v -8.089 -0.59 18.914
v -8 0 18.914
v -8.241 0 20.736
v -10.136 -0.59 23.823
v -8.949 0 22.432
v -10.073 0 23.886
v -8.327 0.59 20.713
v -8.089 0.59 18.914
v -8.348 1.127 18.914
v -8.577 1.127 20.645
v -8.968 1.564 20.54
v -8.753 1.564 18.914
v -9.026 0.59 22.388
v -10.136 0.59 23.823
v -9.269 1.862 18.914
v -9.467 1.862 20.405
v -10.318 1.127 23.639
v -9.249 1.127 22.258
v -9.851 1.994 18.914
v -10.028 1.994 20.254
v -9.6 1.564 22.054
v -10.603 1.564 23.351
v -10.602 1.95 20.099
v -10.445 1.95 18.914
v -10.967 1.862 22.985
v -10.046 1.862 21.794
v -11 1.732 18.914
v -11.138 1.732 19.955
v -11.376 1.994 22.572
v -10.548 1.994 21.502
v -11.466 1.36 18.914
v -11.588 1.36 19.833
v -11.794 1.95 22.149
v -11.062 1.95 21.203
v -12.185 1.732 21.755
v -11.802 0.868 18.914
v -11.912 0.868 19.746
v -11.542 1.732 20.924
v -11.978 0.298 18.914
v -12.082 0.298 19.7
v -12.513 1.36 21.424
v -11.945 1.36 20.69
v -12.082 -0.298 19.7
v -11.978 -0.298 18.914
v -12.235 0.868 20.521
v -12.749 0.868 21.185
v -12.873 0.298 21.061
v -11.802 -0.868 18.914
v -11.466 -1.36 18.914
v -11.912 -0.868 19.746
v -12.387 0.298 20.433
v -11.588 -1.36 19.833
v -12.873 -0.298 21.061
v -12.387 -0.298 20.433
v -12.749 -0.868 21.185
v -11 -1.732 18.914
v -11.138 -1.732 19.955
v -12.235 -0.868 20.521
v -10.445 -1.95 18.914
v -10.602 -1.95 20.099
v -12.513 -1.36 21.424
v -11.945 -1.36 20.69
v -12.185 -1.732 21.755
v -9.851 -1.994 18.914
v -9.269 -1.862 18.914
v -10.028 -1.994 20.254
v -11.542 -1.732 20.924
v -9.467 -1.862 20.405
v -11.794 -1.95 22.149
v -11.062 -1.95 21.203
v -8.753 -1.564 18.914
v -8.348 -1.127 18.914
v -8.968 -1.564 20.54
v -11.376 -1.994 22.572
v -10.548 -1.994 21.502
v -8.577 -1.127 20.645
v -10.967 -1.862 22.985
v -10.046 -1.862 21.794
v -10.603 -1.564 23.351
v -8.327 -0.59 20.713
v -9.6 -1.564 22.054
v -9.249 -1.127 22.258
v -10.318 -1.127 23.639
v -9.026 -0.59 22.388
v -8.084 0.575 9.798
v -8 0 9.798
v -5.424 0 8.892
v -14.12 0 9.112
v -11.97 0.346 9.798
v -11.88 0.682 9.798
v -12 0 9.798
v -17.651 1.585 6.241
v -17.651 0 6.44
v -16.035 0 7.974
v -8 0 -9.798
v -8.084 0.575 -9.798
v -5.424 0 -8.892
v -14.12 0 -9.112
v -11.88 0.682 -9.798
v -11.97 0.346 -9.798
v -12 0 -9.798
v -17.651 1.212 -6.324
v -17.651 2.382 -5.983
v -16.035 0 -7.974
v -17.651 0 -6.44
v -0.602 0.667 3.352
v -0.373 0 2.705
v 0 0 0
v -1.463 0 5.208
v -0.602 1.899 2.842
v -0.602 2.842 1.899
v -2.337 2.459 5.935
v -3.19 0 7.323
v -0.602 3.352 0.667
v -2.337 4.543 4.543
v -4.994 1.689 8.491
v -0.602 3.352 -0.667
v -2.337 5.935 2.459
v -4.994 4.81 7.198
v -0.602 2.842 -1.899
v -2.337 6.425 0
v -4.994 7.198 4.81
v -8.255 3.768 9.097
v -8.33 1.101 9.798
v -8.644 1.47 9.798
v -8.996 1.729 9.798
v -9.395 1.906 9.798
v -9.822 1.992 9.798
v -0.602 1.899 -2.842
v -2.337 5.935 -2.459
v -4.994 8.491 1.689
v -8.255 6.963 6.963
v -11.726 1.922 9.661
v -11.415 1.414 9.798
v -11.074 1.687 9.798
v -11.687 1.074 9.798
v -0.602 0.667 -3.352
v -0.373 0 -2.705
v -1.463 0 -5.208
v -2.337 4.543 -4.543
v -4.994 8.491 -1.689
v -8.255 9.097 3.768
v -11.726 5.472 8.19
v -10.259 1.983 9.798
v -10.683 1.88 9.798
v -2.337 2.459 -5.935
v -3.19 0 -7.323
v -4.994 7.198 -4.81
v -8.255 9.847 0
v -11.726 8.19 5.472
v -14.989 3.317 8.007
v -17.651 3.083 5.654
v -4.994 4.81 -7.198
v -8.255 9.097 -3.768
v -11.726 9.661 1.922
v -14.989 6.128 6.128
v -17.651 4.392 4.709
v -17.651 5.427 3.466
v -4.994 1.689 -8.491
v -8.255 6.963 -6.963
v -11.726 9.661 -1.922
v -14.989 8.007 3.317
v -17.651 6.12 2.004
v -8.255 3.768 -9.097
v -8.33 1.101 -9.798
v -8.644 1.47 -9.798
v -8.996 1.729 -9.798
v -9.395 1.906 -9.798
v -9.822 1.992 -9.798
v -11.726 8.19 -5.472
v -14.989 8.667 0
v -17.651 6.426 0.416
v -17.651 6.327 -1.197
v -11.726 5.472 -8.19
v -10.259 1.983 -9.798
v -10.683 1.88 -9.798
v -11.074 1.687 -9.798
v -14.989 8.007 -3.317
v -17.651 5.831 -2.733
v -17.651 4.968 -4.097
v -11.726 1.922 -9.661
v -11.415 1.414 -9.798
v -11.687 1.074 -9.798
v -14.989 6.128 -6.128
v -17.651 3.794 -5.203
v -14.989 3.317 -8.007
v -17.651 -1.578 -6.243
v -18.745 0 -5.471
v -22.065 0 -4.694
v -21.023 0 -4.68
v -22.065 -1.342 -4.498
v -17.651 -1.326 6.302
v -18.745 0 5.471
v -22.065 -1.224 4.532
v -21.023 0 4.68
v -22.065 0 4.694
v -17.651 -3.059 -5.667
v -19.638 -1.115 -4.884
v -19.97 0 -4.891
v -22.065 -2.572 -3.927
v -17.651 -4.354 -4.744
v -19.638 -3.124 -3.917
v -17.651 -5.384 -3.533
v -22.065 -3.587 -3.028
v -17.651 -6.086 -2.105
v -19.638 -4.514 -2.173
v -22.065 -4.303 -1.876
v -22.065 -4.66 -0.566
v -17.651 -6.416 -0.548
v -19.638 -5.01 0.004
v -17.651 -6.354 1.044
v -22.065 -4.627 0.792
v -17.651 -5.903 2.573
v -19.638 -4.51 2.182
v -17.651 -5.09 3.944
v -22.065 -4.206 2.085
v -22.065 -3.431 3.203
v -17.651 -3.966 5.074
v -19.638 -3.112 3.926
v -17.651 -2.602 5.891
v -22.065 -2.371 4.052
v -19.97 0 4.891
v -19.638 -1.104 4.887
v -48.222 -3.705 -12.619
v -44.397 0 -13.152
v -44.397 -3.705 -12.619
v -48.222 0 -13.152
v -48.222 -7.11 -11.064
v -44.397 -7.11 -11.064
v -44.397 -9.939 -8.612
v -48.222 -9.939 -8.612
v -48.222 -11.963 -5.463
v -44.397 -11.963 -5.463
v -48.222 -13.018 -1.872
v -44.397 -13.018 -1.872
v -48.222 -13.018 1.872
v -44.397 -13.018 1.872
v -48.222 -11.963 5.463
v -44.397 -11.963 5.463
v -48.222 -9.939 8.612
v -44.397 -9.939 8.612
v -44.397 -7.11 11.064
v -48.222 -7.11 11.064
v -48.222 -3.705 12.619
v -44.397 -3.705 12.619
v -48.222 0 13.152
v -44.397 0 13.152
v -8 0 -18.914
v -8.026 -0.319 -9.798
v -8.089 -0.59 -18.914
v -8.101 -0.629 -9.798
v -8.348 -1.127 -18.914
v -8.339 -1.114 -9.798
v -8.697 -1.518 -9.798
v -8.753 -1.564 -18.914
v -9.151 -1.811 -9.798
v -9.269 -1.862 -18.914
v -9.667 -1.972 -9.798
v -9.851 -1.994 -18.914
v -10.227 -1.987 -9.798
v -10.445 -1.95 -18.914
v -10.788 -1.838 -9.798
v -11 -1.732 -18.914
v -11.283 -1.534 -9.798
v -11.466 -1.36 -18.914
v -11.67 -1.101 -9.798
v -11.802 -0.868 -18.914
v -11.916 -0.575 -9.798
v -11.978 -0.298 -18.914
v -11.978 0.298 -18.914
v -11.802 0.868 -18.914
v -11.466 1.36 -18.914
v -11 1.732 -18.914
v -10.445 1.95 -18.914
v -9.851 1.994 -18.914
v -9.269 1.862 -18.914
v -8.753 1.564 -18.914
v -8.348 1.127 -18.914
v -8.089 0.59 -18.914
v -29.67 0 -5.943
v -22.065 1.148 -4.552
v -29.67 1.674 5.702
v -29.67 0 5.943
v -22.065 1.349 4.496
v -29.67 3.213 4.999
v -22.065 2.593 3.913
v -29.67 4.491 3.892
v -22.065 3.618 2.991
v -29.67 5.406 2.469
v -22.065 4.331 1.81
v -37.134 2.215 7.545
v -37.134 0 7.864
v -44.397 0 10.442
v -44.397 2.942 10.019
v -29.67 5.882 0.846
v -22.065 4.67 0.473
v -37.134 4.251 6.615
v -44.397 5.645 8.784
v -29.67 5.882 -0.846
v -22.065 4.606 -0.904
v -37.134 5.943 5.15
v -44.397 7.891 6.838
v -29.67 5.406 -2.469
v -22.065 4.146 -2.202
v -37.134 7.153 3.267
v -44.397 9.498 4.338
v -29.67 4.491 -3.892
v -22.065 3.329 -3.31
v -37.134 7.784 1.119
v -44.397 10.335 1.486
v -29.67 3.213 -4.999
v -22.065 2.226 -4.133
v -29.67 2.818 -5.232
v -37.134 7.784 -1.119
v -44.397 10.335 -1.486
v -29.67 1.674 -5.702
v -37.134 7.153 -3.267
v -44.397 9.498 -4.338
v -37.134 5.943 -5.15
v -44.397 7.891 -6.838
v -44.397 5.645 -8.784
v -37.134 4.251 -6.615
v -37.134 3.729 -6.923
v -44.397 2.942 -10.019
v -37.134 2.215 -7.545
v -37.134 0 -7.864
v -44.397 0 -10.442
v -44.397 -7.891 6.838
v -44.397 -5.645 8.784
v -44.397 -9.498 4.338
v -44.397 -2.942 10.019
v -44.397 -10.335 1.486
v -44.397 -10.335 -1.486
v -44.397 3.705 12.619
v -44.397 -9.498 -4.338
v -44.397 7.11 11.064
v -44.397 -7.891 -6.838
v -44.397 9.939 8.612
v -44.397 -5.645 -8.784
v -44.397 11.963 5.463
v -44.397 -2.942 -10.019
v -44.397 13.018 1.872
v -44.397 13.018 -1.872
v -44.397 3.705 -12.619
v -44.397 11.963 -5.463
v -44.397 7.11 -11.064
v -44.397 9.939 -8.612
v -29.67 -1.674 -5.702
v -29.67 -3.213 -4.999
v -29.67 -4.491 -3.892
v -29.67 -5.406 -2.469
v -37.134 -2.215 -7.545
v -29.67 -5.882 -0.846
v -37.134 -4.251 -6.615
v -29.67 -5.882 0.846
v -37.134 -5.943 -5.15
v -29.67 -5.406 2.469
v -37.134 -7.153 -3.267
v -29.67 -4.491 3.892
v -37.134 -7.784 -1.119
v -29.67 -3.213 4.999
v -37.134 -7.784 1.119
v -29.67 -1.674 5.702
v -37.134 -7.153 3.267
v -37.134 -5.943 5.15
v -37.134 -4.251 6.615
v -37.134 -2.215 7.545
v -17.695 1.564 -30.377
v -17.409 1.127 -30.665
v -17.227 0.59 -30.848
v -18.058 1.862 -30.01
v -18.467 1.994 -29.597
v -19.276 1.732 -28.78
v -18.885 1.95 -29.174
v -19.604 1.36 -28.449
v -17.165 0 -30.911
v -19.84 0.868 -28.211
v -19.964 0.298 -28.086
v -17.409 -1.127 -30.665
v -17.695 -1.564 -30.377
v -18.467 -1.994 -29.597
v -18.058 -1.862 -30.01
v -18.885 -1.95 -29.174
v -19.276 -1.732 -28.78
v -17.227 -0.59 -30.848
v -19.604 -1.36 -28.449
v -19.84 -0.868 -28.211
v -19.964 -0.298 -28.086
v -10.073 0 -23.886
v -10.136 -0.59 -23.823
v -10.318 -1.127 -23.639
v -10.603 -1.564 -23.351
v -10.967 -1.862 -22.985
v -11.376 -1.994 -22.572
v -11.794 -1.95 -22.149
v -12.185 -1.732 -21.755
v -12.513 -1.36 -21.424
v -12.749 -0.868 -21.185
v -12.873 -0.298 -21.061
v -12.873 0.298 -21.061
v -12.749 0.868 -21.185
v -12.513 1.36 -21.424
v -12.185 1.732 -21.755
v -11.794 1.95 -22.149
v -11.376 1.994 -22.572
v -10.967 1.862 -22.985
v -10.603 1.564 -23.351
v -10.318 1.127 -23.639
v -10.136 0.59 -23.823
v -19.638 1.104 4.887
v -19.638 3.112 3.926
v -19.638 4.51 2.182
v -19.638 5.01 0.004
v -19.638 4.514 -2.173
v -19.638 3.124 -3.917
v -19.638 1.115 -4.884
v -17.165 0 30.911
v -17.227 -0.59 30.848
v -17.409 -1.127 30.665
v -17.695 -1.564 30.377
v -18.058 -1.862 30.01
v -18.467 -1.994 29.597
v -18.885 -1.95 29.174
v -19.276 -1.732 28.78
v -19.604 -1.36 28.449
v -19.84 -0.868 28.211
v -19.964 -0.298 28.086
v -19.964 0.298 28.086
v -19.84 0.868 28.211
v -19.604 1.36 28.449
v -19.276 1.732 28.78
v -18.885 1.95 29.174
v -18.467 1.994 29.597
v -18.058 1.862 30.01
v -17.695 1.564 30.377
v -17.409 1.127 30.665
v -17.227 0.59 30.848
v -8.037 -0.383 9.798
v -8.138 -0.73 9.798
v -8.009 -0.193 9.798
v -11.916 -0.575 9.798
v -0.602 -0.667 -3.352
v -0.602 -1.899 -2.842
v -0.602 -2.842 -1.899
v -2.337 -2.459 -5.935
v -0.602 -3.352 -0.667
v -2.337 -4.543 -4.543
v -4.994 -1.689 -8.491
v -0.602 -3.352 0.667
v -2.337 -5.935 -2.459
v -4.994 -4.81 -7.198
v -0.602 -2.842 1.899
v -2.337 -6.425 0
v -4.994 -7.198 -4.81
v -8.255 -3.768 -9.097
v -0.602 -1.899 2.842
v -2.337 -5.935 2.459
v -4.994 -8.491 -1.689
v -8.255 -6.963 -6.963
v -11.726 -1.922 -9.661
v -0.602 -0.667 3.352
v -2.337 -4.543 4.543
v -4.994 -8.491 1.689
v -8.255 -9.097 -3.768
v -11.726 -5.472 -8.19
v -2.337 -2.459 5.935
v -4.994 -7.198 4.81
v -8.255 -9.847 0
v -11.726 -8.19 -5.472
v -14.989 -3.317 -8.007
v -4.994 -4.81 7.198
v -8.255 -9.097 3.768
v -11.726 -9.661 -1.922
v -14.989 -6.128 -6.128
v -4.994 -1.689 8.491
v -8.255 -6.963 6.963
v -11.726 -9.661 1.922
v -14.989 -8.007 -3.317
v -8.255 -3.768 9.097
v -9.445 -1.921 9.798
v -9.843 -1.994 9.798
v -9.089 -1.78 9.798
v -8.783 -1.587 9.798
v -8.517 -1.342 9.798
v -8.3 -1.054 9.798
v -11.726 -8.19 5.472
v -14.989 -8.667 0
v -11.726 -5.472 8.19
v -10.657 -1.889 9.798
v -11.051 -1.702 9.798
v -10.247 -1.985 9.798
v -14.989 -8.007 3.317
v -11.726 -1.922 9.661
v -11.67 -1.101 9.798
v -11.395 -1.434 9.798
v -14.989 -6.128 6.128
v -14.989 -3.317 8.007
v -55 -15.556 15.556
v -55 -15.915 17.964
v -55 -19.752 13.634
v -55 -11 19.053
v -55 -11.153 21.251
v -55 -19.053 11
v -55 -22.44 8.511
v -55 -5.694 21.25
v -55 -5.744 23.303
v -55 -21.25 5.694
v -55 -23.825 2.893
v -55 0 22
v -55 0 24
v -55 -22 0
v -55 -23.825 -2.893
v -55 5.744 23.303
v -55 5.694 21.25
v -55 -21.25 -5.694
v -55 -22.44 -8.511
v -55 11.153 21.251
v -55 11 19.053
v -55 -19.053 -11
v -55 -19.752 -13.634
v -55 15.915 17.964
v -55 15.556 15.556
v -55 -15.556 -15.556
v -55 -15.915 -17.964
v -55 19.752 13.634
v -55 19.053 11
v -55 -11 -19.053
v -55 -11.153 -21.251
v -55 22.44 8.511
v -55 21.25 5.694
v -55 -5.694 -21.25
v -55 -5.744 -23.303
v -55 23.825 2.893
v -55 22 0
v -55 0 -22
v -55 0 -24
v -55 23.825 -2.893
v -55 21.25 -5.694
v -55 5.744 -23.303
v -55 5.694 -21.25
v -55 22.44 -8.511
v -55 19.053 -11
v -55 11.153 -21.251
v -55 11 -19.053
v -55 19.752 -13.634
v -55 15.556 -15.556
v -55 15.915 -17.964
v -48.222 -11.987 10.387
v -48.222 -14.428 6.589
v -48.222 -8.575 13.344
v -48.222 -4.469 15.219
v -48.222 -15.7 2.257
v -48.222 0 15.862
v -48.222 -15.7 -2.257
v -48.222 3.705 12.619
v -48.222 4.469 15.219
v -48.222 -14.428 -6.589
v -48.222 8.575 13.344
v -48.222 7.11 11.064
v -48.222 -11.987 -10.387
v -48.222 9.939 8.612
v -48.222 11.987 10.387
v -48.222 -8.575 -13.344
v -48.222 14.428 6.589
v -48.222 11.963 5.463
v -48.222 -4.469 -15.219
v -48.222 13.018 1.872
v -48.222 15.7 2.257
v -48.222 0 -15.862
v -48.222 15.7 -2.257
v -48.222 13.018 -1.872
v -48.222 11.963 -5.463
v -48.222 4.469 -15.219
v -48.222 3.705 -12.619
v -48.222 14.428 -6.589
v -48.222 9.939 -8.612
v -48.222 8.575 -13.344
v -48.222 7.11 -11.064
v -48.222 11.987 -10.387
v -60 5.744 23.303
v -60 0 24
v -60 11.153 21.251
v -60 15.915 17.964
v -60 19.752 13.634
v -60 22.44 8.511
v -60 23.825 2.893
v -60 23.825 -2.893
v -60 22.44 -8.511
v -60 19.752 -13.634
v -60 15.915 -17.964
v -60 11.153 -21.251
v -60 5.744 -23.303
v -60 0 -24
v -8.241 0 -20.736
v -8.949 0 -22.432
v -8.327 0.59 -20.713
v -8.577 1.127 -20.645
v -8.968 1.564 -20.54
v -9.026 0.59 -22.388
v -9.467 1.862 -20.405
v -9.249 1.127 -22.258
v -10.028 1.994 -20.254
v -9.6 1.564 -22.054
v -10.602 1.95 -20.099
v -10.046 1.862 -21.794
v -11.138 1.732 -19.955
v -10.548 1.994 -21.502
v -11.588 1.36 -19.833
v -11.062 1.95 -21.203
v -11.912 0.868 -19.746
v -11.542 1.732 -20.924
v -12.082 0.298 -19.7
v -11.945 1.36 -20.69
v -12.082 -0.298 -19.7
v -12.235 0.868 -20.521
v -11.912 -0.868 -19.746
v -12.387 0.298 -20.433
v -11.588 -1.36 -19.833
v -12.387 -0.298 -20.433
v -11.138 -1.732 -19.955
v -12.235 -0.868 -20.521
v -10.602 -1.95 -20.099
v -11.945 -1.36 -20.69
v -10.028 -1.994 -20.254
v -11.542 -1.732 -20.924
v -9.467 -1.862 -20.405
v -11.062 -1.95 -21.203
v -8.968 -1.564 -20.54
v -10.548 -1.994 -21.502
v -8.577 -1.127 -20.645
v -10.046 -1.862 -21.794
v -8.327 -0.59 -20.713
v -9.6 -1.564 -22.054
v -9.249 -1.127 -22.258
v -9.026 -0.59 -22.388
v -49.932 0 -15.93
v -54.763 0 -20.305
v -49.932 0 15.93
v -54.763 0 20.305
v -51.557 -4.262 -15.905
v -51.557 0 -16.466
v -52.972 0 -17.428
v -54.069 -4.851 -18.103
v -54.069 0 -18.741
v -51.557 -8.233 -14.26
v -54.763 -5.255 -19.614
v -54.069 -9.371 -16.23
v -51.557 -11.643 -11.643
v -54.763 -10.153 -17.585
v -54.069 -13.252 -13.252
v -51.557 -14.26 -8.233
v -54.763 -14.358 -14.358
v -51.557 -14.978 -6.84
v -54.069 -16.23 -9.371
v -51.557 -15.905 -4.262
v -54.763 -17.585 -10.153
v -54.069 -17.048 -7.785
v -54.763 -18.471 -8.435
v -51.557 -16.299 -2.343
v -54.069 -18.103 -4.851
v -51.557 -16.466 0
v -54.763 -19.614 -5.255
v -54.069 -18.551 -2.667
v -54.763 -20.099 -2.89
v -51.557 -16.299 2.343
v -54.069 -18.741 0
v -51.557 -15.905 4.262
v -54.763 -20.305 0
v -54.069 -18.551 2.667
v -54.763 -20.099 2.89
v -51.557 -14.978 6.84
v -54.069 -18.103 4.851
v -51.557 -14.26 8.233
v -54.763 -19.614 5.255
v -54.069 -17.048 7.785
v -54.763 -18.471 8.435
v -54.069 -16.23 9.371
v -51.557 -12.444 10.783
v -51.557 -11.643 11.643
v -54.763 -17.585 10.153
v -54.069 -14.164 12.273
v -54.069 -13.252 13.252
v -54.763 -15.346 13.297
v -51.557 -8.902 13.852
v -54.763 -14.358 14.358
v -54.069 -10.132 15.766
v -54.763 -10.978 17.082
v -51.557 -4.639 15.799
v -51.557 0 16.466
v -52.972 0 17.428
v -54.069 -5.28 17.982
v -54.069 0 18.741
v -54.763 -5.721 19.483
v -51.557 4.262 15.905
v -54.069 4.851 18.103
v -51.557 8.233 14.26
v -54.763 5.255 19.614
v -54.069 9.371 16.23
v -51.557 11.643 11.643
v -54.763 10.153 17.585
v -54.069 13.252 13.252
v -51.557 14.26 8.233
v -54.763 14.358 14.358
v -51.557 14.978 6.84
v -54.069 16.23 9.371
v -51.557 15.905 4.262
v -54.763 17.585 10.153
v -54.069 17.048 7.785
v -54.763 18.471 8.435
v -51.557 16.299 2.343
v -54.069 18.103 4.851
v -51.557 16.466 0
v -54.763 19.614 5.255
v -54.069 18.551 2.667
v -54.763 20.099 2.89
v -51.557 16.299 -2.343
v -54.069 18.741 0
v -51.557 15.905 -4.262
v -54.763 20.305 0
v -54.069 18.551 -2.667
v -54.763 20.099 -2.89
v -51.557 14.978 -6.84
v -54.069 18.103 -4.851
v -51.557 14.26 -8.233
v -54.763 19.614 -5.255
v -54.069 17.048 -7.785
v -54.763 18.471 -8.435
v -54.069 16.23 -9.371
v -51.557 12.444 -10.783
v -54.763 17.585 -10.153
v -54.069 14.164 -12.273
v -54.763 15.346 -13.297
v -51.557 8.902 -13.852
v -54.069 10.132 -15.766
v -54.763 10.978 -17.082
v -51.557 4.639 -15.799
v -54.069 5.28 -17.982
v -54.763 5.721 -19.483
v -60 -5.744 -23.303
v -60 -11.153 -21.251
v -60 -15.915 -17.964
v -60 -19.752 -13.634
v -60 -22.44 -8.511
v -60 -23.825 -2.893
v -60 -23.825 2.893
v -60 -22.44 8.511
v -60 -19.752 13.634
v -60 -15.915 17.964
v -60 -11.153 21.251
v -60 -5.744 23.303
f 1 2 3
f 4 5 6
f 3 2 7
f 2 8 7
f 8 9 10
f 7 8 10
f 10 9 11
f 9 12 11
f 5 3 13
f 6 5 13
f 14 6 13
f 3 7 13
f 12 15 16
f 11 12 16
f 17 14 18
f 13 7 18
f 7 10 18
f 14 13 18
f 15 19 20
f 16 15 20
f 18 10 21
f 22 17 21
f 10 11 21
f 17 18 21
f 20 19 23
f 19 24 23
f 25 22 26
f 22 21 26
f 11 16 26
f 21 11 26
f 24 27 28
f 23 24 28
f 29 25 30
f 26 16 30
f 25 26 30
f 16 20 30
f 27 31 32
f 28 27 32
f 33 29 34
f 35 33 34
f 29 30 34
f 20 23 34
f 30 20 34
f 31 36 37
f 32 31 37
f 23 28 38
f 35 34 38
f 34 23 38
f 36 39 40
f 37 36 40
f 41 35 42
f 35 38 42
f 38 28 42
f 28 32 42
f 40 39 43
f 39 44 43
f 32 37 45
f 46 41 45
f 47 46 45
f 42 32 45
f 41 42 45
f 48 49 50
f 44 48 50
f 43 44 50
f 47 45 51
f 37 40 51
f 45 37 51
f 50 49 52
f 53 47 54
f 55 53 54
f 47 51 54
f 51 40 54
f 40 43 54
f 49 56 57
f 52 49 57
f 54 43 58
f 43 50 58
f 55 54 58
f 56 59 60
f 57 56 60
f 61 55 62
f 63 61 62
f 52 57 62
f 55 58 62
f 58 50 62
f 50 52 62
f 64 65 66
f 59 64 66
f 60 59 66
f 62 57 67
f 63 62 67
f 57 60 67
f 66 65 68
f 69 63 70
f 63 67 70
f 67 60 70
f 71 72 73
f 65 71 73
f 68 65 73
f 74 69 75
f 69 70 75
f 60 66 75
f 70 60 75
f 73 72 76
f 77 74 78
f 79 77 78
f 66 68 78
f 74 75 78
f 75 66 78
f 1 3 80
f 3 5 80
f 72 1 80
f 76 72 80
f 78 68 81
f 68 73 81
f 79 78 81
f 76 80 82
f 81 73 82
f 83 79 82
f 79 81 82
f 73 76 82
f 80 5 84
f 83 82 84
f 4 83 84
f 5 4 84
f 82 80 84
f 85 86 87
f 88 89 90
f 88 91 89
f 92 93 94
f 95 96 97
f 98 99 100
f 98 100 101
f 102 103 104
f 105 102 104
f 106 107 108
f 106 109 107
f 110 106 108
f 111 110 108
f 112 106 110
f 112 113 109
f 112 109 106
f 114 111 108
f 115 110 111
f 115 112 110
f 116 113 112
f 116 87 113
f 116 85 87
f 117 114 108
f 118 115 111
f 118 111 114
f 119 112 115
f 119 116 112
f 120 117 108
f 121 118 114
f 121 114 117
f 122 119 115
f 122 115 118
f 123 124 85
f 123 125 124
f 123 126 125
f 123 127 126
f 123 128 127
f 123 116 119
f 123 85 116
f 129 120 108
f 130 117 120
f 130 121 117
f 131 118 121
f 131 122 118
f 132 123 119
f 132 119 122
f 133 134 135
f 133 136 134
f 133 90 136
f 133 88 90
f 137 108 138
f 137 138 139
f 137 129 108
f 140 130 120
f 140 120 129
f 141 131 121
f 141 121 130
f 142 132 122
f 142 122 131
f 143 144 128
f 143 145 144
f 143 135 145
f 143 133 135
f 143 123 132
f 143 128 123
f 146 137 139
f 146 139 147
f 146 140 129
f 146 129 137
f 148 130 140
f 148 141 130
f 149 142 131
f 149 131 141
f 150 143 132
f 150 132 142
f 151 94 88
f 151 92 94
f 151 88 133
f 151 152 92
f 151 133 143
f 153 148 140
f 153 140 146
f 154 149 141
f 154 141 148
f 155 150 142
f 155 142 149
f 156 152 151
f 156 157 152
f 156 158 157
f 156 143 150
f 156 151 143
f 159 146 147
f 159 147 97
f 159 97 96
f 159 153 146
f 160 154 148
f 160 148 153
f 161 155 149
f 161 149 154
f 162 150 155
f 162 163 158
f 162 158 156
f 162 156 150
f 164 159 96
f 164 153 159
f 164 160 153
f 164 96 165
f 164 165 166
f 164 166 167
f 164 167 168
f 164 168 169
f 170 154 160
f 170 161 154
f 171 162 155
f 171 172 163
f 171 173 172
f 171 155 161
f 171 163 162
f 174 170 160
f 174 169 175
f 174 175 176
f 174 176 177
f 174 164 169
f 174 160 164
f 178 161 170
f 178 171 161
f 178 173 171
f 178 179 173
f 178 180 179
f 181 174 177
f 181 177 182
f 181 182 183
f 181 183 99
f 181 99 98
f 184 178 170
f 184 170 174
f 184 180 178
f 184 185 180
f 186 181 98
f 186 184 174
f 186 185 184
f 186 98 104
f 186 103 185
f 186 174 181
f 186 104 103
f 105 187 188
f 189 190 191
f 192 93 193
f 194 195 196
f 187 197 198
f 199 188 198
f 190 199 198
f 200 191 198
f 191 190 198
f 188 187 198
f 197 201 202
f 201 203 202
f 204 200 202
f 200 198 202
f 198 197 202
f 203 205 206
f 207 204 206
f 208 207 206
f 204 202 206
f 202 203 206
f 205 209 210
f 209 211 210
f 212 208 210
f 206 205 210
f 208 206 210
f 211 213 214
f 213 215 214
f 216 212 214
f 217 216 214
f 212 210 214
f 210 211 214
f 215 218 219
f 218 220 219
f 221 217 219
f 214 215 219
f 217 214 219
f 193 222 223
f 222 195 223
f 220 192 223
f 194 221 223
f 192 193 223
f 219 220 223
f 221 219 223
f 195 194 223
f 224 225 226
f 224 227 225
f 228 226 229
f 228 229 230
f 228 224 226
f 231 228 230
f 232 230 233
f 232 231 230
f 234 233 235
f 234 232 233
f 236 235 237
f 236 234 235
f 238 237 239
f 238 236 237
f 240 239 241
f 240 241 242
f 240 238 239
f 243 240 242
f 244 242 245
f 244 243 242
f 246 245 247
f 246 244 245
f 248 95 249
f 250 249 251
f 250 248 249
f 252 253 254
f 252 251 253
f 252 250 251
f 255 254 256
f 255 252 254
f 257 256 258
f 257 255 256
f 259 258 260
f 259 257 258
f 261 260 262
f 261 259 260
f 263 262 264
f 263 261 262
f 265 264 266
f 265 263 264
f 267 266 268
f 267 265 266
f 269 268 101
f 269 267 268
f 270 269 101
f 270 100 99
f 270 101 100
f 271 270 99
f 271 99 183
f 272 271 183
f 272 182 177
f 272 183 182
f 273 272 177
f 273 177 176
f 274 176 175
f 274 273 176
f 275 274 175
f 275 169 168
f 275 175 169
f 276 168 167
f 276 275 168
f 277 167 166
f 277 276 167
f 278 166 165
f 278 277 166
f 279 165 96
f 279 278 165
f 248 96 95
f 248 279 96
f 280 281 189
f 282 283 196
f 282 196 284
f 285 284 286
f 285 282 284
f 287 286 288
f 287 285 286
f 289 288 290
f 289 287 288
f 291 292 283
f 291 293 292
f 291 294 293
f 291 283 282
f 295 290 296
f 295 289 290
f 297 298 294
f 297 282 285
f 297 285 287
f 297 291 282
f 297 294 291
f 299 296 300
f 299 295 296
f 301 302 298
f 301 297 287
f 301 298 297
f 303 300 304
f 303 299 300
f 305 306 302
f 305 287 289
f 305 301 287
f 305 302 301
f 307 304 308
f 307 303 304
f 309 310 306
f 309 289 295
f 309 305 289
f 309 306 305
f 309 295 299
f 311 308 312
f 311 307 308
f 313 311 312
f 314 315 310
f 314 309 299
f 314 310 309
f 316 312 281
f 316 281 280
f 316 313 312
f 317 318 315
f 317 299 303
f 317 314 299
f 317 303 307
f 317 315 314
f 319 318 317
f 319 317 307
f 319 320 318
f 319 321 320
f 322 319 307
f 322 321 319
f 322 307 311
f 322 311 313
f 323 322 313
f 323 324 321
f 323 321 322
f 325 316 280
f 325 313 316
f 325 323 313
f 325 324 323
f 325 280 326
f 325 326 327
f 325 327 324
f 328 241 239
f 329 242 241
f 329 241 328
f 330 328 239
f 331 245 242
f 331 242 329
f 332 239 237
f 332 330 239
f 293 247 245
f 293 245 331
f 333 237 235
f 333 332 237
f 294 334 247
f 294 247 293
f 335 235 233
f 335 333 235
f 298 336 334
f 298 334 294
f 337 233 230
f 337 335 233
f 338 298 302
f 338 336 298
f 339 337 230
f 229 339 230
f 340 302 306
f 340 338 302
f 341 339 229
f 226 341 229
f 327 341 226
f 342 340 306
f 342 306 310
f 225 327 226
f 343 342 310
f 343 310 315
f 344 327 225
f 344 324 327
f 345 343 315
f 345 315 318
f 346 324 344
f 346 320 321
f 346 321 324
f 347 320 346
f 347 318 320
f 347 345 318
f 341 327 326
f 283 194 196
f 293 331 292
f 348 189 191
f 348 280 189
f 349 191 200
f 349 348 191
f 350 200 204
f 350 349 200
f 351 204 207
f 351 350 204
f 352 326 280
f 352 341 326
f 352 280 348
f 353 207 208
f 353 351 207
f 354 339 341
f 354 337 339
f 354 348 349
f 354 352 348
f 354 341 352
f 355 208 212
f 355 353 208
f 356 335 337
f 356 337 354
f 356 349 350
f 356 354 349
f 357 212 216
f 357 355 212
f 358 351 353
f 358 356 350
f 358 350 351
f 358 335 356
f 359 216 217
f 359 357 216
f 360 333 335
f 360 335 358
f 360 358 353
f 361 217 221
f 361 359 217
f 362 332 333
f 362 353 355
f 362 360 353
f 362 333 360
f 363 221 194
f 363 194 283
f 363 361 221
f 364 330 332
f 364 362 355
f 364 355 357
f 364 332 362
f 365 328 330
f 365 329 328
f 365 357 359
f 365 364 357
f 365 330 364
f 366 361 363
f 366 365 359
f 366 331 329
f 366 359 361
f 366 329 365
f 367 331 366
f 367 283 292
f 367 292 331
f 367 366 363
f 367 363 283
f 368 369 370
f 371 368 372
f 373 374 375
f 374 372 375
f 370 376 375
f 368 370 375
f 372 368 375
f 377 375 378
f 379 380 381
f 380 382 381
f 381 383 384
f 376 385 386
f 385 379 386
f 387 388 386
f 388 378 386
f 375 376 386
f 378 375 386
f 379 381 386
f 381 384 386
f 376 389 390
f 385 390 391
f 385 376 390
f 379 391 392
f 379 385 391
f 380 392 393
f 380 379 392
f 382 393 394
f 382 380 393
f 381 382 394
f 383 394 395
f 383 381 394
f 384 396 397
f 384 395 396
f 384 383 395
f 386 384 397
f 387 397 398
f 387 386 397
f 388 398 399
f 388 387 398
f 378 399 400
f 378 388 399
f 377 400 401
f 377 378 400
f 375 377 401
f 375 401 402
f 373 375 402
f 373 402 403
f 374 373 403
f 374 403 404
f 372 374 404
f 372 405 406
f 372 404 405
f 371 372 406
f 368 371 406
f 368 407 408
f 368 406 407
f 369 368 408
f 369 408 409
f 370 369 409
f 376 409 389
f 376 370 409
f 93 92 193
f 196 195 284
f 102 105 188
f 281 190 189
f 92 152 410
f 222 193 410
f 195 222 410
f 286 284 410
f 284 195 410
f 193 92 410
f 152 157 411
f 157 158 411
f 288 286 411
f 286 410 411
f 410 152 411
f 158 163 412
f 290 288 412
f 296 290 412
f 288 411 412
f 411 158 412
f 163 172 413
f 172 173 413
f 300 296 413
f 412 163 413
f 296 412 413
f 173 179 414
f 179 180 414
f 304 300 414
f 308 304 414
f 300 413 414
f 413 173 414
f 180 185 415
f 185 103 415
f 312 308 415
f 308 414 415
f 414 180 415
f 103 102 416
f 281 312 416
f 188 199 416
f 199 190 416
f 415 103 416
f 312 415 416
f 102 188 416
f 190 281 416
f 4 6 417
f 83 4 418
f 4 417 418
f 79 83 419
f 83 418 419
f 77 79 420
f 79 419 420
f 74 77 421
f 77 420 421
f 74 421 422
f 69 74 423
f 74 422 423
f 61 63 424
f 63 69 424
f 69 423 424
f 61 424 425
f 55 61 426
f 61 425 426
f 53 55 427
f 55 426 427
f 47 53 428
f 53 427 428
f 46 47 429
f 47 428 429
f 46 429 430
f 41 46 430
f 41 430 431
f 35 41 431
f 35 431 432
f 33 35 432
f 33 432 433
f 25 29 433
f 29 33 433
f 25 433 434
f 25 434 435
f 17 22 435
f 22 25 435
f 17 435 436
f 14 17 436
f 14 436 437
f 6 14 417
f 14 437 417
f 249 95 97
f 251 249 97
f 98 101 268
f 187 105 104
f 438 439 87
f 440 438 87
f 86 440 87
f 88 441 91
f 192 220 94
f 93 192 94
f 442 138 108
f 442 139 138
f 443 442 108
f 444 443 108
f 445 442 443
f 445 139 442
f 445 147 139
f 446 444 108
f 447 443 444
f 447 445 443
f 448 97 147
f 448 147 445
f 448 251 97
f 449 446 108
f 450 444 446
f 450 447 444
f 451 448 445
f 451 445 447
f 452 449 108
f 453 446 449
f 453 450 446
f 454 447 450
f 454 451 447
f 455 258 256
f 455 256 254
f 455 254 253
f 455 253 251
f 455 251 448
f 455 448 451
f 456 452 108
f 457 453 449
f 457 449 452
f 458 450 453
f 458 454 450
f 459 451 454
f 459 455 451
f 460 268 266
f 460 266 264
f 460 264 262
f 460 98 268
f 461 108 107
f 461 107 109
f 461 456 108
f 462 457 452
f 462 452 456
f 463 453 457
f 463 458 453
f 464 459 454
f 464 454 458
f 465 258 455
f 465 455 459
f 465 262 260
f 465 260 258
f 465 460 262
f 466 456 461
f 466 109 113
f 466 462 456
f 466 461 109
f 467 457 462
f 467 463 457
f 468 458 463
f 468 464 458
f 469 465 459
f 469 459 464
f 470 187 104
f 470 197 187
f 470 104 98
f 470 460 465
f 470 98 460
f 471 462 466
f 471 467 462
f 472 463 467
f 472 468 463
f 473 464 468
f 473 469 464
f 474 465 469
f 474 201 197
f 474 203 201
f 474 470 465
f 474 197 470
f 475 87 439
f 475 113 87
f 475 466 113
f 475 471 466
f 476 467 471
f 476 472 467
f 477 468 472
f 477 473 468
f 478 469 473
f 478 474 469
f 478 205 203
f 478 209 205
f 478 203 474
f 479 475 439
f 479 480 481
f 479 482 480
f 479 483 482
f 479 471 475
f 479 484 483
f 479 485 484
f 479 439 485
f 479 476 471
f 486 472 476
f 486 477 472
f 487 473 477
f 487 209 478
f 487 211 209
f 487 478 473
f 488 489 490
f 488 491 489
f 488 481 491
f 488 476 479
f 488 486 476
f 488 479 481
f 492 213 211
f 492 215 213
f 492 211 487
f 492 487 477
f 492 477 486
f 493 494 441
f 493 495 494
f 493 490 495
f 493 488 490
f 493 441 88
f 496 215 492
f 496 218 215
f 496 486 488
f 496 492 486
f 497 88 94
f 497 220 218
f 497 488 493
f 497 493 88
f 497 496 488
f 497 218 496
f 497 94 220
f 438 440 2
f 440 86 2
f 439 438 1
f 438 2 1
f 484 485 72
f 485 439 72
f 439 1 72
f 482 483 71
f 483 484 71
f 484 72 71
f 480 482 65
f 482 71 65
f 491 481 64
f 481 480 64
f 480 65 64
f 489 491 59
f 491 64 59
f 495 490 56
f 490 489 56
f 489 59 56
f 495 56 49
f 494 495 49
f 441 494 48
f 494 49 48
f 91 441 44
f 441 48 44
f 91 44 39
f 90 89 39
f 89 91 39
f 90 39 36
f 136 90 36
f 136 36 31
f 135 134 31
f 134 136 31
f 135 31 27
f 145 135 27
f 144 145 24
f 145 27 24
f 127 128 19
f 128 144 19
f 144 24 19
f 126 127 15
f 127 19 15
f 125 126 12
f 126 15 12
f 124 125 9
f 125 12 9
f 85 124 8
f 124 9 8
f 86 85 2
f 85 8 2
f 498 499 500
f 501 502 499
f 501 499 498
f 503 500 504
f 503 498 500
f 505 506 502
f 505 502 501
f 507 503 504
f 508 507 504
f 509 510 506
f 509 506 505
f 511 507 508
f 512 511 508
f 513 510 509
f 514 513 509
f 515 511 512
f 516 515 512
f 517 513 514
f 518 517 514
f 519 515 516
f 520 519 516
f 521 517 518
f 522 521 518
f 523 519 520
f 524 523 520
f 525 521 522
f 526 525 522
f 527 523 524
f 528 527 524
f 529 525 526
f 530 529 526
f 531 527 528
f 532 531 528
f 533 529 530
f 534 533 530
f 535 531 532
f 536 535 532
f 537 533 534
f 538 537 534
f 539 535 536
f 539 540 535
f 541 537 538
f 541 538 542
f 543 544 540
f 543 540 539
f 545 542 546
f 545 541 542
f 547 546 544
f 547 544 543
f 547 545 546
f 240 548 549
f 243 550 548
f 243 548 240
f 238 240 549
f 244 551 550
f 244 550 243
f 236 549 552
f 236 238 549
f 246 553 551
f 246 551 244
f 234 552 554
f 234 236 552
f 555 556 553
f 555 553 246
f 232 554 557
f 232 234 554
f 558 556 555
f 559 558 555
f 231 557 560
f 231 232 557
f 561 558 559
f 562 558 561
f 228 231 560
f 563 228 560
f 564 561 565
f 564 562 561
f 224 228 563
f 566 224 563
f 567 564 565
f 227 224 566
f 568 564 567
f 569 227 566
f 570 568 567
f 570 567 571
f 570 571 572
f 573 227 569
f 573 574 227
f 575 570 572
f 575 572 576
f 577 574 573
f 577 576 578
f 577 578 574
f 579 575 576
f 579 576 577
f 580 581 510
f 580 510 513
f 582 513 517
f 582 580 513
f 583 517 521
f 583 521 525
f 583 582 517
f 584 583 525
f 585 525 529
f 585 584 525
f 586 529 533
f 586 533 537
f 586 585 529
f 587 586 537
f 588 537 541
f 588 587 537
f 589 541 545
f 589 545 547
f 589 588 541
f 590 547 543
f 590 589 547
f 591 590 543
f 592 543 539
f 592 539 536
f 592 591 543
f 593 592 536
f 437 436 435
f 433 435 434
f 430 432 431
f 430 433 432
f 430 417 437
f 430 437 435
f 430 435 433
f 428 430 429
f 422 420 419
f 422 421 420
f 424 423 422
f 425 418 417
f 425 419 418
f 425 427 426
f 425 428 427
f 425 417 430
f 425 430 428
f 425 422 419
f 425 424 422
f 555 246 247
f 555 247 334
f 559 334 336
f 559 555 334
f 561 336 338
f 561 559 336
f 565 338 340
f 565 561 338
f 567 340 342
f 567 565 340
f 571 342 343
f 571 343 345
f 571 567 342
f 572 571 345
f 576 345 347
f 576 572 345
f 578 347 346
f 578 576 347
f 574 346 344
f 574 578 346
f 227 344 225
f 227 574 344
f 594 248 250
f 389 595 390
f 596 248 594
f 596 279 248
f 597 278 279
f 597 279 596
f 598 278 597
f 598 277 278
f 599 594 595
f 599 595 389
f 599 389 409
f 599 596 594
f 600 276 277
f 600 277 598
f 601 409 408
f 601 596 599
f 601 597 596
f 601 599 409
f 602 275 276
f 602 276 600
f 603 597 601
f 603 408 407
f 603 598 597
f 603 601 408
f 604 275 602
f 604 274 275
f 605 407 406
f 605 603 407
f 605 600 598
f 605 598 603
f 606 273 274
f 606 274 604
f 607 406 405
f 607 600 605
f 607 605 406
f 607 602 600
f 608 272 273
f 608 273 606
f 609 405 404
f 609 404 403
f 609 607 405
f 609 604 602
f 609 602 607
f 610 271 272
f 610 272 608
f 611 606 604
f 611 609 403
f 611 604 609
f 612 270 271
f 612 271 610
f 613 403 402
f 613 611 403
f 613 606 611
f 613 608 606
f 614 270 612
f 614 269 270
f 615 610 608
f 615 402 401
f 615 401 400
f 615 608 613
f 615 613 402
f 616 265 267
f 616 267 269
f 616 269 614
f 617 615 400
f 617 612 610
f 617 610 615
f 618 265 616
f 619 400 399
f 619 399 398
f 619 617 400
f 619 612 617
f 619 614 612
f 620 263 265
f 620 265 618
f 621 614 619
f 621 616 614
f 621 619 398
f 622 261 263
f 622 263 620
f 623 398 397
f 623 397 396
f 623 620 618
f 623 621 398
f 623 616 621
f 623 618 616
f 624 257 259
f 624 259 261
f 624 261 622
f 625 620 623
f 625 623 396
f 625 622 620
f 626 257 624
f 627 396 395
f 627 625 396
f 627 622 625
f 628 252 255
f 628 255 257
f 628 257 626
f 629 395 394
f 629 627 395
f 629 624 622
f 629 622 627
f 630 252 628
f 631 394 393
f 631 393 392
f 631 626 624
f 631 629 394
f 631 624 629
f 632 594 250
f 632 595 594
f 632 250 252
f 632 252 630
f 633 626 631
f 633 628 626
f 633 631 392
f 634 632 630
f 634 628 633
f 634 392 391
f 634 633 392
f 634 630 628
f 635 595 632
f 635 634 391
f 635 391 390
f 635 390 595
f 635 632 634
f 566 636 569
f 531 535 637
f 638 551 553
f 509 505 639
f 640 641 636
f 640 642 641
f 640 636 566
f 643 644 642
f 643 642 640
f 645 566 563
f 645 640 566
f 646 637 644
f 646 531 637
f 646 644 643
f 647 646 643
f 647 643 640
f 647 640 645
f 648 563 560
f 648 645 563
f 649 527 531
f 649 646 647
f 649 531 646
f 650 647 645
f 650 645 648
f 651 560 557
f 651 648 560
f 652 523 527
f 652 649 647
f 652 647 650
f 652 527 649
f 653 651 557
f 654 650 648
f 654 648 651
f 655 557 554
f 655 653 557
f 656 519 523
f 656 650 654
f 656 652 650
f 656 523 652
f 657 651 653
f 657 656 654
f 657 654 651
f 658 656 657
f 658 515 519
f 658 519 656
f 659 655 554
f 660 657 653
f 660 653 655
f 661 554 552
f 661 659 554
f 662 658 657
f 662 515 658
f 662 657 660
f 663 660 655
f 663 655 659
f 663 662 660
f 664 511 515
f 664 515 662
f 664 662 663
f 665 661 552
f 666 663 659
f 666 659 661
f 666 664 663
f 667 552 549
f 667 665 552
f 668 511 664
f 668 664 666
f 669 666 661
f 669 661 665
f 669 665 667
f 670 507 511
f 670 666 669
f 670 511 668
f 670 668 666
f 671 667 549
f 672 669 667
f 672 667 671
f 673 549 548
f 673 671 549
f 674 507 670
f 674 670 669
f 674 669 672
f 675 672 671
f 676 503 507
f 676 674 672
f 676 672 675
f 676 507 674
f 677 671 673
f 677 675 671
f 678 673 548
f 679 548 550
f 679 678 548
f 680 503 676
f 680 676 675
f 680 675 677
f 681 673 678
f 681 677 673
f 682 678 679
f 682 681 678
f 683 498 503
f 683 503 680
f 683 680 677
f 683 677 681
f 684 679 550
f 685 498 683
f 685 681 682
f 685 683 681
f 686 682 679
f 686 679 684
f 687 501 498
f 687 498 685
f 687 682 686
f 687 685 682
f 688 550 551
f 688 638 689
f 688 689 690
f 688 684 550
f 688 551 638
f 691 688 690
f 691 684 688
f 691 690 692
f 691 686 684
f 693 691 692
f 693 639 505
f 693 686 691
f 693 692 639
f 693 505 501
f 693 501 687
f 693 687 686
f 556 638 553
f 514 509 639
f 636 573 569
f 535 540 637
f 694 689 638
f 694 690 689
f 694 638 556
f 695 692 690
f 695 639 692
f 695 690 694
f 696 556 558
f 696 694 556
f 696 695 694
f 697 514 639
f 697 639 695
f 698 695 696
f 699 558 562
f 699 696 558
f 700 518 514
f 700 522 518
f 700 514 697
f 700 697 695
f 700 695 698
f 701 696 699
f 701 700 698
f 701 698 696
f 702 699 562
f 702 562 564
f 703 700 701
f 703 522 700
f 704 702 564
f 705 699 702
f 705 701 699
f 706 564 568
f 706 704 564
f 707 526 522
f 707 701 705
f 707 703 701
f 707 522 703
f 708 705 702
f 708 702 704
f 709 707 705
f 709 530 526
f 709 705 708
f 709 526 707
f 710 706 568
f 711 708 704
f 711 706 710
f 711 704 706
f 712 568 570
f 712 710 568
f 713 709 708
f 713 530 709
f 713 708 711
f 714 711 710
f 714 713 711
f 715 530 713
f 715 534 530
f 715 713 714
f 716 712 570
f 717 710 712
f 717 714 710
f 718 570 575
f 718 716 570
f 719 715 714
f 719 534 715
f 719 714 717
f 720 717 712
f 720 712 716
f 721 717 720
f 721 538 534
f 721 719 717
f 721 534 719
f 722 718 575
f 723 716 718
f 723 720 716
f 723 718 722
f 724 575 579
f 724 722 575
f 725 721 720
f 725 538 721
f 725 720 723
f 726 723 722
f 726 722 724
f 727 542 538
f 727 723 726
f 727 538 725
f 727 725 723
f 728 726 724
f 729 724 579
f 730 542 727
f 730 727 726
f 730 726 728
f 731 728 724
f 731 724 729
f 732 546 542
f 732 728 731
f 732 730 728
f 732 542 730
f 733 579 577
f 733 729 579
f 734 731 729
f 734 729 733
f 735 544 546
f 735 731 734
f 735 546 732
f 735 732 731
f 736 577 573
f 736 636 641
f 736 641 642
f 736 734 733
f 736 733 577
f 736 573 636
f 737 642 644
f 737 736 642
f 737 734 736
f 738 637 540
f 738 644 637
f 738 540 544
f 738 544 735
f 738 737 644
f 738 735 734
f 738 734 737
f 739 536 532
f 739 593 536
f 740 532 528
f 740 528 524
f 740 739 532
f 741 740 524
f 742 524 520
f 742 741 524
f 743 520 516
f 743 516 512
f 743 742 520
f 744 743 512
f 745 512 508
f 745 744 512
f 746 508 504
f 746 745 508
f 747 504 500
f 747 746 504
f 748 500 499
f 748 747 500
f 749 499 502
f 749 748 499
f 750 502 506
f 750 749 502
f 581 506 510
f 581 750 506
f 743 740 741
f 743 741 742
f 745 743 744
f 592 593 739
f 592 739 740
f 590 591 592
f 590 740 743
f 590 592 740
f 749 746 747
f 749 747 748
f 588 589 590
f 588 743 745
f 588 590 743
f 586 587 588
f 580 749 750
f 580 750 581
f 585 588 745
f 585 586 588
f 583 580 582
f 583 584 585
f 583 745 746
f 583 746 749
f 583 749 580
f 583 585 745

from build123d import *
from build123d import SkipClean  # not in build123d's __all__

# Parameters (mm, degrees)
F2_R          = 5
F3_R          = 2
F4_DEPTH      = 25
F4_DEPTH_BACK = 25
F6_R          = 2


with BuildPart() as f1:
    # F0 (on Front) → F1 (revolve)
    with BuildSketch(Plane.XZ):
        with BuildLine():
            Line((-60, 0), (0, 0))
            ThreePointArc((0, 0), (-7.7499262393, 9.7435706018), (-18.9874336143, 4.3847505093))
            ThreePointArc((-18.9874336143, 4.3847505093), (-31.9220569404, 6.4479089357), (-44.3965084851, 10.4415491223))
            Line((-44.3965084851, 10.4415491223), (-44.3965084851, 13.1515692919))
            Line((-44.3965084851, 13.1515692919), (-48.2224225998, 13.1515692919))
            Line((-48.2224225998, 13.1515692919), (-48.2224225998, 15.8615894616))
            ThreePointArc((-48.2224225998, 15.8615894616), (-52.9723552194, 17.427920622), (-55, 22))
            Line((-55, 22), (-55, 24))
            Line((-55, 24), (-60, 24))
            Line((-60, 24), (-60, 0))
        make_face()
    revolve(axis=Axis((-30, 0, 0), (-1, 0, 0)))

    # F2
    f2_edges = [f1.edges().sort_by_distance(p)[0] for p in [
        (-18.987434, 0, -4.384751),
    ]]
    fillet(f2_edges, radius=F2_R)

    # F3 (on Top) → F4 (cut, two sides)
    with BuildSketch(Plane.XY) as f4_sk:
        with Locations((-10, 0)):
            Circle(F3_R)
    extrude(amount=-F4_DEPTH, mode=Mode.SUBTRACT)
    extrude(f4_sk.sketch, amount=F4_DEPTH_BACK, mode=Mode.SUBTRACT)

    # F7: sweep along a path in F5
    with BuildLine(Plane.XZ) as f7_path:
        Line((-10, 0), (-10, -18.9135132155))
        ThreePointArc((-10, -18.9135132155), (-10.3850895053, -20.8377276333), (-11.4810404502, -22.4655441398))
        Line((-11.4810404502, -22.4655441398), (-18.572177738, -29.4906590134))
    # F6 (on Top) → F7 (sweep)
    with BuildSketch(Plane.XY):
        with Locations((-10, 0)):
            Circle(F6_R)
    sweep(path=f7_path.line)

    # F8: F1 across plane


with BuildPart() as f1_1:
    add(f1.part, clean=False)
    with SkipClean():  # cleaning this boolean's faces spoils the solid; the shape is the same uncleaned
        add(f1.part.mirror(Plane.XY), clean=False)


solid = f1_1.part
